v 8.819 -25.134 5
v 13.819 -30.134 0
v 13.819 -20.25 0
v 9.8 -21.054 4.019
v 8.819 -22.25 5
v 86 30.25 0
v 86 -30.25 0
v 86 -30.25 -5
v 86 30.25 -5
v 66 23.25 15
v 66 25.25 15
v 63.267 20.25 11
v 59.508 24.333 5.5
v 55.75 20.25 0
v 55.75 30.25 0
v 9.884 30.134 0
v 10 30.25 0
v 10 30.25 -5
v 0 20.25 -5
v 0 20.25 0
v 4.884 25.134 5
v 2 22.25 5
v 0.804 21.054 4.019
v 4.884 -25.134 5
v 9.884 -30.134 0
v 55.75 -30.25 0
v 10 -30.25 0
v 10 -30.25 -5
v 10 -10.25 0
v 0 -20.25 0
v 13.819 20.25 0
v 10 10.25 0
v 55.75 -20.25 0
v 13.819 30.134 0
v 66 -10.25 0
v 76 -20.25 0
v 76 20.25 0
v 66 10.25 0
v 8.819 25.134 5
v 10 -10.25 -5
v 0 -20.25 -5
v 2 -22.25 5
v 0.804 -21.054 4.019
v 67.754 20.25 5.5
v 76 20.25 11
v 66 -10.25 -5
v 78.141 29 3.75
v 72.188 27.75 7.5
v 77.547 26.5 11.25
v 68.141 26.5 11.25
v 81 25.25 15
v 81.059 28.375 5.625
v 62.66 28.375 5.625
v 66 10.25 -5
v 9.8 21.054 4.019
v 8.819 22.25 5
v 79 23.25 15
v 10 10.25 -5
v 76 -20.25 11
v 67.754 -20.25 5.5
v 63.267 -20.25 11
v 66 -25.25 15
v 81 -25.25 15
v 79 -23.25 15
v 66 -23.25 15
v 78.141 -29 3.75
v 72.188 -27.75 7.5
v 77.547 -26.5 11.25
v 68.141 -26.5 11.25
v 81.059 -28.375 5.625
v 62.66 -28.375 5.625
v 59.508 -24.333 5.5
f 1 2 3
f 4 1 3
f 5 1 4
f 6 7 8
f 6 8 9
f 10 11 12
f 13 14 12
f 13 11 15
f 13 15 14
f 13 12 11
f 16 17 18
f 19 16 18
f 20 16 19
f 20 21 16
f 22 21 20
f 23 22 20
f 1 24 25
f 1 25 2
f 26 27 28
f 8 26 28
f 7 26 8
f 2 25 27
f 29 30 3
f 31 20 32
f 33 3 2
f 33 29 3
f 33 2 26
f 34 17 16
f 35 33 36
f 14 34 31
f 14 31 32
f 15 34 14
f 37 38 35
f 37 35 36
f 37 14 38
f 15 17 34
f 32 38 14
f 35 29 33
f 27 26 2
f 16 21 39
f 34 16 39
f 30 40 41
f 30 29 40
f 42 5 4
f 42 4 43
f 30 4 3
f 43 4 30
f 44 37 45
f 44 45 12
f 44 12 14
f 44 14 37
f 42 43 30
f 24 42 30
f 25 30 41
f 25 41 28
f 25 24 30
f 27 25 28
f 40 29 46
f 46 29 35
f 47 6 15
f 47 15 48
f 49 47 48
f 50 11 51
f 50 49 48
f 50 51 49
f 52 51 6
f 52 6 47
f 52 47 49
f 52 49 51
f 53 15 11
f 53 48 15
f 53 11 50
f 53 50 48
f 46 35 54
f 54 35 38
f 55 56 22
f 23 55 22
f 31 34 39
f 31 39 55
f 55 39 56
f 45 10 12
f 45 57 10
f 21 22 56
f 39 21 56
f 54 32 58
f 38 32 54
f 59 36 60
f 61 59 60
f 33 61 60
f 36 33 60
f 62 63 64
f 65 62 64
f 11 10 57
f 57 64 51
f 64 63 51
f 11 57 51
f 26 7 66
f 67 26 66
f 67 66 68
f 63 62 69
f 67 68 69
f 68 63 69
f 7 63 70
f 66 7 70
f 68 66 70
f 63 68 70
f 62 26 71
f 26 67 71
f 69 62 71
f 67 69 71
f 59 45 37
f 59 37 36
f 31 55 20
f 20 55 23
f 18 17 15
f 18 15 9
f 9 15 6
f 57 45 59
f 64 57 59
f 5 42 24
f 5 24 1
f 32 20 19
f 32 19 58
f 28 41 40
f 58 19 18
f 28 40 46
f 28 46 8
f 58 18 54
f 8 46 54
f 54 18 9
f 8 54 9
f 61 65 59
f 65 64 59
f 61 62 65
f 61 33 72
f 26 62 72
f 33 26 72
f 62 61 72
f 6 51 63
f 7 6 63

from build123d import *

# Parameters (mm, degrees)
F0_W           = 172
F0_H           = 60.5
F4_DEPTH       = 5
F6_SIZE2       = 4
F6_SIZE        = 3
F9_DEPTH       = 5
F10_SIZE       = 4.99999
F11_SIZE2      = 0.99999
F11_SIZE       = 4.99999
F12_SIZE       = 1
F14_W          = 132
F14_H          = 20.5
F15_DEPTH      = 12.5
F17_DEPTH      = 25
F17_DEPTH_BACK = 25


# Not quite as in the source:
# - a fillet or chamfer is up to 0.001 mm smaller than in the source, because OpenCascade refuses the exact size


with BuildPart() as f4:
    # F0 (on Top) → F4 (new body)
    with BuildSketch(Plane.XY):
        Rectangle(F0_W, F0_H)
    extrude(amount=-F4_DEPTH)

    # F3 (on Top) → F5 section 0
    with BuildSketch(Plane.XY):
        Polygon((-86, 0), (-86, -30.25), (-55.75, -30.25), (-55.75, -20.25), (-76, -20.25), (-76, 0), align=None)
    # F2 (on offset) → F5 section 1
    with BuildSketch(Plane.XY.offset(15)):
        Polygon((-76, -20.25), (-76, 0), (-81, 0), (-81, -25.25), (-66, -25.25), (-66, -20.25), align=None)
    loft()

    # F6
    f6_edges = [f4.edges().sort_by_distance(p)[0] for p in [
        (-76, -10.125, 15),
        (-71, -20.25, 15),
    ]]
    chamfer(f6_edges, length=F6_SIZE, length2=F6_SIZE2)

    # F7: F4 across plane


with BuildPart() as f4_1:
    add(f4.part)
    add(f4.part.mirror(Plane.YZ))

    # F8 (on face) → F9 (join)
    with BuildSketch(Plane.XY):
        Polygon((13.8189587742, -20.25), (0, -20.25), (-13.8189587742, -20.25), (-13.8189587742, -30.1344580948), (0, -30.1344580948), (13.8189587742, -30.1344580948), align=None)
    extrude(amount=F9_DEPTH)

    # F10 (size 5 in the source; OpenCascade refuses exactly that, so slightly less here)
    f10_edges = [f4_1.edges().sort_by_distance(p)[0] for p in [
        (13.818959, -25.192229, 5),
        (0, -30.134458, 5),
        (-13.818959, -25.192229, 5),
    ]]
    chamfer(f10_edges, length=F10_SIZE)

    # F11 (size 5 and 1 in the source; OpenCascade refuses exactly that, so slightly less here)
    f11_edges = [f4_1.edges().sort_by_distance(p)[0] for p in [
        (0, -20.25, 5),
    ]]
    f11_side = f4_1.faces().sort_by_distance((0, -20.25, 2.315943))[0]
    chamfer(f11_edges, length=F11_SIZE, length2=F11_SIZE2, reference=f11_side)

    # F12
    f12_edges = [f4_1.edges().sort_by_distance(p)[0] for p in [
        (0, -21.24999, 5),
    ]]
    chamfer(f12_edges, length=F12_SIZE)

    # F13: F4 across plane


with BuildPart() as f4_2:
    add(f4_1.part)
    add(f4_1.part.mirror(Plane.XZ))

    # F14 (on Top) → F15 (cut, symmetric)
    with BuildSketch(Plane.XY):
        Rectangle(F14_W, F14_H)
    extrude(amount=F15_DEPTH, both=True, mode=Mode.SUBTRACT)


with BuildPart() as f17:
    # F16 (on Top) → F17 (new body, two sides)
    with BuildSketch(Plane.XY) as f17_sk:
        Polygon((23.7979591321, 44.0479591321), (0, 20.25), (18.644013716, 1.605986284), (18.644013716, -1.605986284), (0, -20.25), (26.894013716, -47.144013716), (91.0670285058, -47.144013716), (91.0670285058, 44.0479591321), align=None)
    extrude(amount=F17_DEPTH)
    extrude(f17_sk.sketch, amount=-F17_DEPTH_BACK)

    # F18: intersect F4
    add(f4_2.part, mode=Mode.INTERSECT)


solid = f17.part
